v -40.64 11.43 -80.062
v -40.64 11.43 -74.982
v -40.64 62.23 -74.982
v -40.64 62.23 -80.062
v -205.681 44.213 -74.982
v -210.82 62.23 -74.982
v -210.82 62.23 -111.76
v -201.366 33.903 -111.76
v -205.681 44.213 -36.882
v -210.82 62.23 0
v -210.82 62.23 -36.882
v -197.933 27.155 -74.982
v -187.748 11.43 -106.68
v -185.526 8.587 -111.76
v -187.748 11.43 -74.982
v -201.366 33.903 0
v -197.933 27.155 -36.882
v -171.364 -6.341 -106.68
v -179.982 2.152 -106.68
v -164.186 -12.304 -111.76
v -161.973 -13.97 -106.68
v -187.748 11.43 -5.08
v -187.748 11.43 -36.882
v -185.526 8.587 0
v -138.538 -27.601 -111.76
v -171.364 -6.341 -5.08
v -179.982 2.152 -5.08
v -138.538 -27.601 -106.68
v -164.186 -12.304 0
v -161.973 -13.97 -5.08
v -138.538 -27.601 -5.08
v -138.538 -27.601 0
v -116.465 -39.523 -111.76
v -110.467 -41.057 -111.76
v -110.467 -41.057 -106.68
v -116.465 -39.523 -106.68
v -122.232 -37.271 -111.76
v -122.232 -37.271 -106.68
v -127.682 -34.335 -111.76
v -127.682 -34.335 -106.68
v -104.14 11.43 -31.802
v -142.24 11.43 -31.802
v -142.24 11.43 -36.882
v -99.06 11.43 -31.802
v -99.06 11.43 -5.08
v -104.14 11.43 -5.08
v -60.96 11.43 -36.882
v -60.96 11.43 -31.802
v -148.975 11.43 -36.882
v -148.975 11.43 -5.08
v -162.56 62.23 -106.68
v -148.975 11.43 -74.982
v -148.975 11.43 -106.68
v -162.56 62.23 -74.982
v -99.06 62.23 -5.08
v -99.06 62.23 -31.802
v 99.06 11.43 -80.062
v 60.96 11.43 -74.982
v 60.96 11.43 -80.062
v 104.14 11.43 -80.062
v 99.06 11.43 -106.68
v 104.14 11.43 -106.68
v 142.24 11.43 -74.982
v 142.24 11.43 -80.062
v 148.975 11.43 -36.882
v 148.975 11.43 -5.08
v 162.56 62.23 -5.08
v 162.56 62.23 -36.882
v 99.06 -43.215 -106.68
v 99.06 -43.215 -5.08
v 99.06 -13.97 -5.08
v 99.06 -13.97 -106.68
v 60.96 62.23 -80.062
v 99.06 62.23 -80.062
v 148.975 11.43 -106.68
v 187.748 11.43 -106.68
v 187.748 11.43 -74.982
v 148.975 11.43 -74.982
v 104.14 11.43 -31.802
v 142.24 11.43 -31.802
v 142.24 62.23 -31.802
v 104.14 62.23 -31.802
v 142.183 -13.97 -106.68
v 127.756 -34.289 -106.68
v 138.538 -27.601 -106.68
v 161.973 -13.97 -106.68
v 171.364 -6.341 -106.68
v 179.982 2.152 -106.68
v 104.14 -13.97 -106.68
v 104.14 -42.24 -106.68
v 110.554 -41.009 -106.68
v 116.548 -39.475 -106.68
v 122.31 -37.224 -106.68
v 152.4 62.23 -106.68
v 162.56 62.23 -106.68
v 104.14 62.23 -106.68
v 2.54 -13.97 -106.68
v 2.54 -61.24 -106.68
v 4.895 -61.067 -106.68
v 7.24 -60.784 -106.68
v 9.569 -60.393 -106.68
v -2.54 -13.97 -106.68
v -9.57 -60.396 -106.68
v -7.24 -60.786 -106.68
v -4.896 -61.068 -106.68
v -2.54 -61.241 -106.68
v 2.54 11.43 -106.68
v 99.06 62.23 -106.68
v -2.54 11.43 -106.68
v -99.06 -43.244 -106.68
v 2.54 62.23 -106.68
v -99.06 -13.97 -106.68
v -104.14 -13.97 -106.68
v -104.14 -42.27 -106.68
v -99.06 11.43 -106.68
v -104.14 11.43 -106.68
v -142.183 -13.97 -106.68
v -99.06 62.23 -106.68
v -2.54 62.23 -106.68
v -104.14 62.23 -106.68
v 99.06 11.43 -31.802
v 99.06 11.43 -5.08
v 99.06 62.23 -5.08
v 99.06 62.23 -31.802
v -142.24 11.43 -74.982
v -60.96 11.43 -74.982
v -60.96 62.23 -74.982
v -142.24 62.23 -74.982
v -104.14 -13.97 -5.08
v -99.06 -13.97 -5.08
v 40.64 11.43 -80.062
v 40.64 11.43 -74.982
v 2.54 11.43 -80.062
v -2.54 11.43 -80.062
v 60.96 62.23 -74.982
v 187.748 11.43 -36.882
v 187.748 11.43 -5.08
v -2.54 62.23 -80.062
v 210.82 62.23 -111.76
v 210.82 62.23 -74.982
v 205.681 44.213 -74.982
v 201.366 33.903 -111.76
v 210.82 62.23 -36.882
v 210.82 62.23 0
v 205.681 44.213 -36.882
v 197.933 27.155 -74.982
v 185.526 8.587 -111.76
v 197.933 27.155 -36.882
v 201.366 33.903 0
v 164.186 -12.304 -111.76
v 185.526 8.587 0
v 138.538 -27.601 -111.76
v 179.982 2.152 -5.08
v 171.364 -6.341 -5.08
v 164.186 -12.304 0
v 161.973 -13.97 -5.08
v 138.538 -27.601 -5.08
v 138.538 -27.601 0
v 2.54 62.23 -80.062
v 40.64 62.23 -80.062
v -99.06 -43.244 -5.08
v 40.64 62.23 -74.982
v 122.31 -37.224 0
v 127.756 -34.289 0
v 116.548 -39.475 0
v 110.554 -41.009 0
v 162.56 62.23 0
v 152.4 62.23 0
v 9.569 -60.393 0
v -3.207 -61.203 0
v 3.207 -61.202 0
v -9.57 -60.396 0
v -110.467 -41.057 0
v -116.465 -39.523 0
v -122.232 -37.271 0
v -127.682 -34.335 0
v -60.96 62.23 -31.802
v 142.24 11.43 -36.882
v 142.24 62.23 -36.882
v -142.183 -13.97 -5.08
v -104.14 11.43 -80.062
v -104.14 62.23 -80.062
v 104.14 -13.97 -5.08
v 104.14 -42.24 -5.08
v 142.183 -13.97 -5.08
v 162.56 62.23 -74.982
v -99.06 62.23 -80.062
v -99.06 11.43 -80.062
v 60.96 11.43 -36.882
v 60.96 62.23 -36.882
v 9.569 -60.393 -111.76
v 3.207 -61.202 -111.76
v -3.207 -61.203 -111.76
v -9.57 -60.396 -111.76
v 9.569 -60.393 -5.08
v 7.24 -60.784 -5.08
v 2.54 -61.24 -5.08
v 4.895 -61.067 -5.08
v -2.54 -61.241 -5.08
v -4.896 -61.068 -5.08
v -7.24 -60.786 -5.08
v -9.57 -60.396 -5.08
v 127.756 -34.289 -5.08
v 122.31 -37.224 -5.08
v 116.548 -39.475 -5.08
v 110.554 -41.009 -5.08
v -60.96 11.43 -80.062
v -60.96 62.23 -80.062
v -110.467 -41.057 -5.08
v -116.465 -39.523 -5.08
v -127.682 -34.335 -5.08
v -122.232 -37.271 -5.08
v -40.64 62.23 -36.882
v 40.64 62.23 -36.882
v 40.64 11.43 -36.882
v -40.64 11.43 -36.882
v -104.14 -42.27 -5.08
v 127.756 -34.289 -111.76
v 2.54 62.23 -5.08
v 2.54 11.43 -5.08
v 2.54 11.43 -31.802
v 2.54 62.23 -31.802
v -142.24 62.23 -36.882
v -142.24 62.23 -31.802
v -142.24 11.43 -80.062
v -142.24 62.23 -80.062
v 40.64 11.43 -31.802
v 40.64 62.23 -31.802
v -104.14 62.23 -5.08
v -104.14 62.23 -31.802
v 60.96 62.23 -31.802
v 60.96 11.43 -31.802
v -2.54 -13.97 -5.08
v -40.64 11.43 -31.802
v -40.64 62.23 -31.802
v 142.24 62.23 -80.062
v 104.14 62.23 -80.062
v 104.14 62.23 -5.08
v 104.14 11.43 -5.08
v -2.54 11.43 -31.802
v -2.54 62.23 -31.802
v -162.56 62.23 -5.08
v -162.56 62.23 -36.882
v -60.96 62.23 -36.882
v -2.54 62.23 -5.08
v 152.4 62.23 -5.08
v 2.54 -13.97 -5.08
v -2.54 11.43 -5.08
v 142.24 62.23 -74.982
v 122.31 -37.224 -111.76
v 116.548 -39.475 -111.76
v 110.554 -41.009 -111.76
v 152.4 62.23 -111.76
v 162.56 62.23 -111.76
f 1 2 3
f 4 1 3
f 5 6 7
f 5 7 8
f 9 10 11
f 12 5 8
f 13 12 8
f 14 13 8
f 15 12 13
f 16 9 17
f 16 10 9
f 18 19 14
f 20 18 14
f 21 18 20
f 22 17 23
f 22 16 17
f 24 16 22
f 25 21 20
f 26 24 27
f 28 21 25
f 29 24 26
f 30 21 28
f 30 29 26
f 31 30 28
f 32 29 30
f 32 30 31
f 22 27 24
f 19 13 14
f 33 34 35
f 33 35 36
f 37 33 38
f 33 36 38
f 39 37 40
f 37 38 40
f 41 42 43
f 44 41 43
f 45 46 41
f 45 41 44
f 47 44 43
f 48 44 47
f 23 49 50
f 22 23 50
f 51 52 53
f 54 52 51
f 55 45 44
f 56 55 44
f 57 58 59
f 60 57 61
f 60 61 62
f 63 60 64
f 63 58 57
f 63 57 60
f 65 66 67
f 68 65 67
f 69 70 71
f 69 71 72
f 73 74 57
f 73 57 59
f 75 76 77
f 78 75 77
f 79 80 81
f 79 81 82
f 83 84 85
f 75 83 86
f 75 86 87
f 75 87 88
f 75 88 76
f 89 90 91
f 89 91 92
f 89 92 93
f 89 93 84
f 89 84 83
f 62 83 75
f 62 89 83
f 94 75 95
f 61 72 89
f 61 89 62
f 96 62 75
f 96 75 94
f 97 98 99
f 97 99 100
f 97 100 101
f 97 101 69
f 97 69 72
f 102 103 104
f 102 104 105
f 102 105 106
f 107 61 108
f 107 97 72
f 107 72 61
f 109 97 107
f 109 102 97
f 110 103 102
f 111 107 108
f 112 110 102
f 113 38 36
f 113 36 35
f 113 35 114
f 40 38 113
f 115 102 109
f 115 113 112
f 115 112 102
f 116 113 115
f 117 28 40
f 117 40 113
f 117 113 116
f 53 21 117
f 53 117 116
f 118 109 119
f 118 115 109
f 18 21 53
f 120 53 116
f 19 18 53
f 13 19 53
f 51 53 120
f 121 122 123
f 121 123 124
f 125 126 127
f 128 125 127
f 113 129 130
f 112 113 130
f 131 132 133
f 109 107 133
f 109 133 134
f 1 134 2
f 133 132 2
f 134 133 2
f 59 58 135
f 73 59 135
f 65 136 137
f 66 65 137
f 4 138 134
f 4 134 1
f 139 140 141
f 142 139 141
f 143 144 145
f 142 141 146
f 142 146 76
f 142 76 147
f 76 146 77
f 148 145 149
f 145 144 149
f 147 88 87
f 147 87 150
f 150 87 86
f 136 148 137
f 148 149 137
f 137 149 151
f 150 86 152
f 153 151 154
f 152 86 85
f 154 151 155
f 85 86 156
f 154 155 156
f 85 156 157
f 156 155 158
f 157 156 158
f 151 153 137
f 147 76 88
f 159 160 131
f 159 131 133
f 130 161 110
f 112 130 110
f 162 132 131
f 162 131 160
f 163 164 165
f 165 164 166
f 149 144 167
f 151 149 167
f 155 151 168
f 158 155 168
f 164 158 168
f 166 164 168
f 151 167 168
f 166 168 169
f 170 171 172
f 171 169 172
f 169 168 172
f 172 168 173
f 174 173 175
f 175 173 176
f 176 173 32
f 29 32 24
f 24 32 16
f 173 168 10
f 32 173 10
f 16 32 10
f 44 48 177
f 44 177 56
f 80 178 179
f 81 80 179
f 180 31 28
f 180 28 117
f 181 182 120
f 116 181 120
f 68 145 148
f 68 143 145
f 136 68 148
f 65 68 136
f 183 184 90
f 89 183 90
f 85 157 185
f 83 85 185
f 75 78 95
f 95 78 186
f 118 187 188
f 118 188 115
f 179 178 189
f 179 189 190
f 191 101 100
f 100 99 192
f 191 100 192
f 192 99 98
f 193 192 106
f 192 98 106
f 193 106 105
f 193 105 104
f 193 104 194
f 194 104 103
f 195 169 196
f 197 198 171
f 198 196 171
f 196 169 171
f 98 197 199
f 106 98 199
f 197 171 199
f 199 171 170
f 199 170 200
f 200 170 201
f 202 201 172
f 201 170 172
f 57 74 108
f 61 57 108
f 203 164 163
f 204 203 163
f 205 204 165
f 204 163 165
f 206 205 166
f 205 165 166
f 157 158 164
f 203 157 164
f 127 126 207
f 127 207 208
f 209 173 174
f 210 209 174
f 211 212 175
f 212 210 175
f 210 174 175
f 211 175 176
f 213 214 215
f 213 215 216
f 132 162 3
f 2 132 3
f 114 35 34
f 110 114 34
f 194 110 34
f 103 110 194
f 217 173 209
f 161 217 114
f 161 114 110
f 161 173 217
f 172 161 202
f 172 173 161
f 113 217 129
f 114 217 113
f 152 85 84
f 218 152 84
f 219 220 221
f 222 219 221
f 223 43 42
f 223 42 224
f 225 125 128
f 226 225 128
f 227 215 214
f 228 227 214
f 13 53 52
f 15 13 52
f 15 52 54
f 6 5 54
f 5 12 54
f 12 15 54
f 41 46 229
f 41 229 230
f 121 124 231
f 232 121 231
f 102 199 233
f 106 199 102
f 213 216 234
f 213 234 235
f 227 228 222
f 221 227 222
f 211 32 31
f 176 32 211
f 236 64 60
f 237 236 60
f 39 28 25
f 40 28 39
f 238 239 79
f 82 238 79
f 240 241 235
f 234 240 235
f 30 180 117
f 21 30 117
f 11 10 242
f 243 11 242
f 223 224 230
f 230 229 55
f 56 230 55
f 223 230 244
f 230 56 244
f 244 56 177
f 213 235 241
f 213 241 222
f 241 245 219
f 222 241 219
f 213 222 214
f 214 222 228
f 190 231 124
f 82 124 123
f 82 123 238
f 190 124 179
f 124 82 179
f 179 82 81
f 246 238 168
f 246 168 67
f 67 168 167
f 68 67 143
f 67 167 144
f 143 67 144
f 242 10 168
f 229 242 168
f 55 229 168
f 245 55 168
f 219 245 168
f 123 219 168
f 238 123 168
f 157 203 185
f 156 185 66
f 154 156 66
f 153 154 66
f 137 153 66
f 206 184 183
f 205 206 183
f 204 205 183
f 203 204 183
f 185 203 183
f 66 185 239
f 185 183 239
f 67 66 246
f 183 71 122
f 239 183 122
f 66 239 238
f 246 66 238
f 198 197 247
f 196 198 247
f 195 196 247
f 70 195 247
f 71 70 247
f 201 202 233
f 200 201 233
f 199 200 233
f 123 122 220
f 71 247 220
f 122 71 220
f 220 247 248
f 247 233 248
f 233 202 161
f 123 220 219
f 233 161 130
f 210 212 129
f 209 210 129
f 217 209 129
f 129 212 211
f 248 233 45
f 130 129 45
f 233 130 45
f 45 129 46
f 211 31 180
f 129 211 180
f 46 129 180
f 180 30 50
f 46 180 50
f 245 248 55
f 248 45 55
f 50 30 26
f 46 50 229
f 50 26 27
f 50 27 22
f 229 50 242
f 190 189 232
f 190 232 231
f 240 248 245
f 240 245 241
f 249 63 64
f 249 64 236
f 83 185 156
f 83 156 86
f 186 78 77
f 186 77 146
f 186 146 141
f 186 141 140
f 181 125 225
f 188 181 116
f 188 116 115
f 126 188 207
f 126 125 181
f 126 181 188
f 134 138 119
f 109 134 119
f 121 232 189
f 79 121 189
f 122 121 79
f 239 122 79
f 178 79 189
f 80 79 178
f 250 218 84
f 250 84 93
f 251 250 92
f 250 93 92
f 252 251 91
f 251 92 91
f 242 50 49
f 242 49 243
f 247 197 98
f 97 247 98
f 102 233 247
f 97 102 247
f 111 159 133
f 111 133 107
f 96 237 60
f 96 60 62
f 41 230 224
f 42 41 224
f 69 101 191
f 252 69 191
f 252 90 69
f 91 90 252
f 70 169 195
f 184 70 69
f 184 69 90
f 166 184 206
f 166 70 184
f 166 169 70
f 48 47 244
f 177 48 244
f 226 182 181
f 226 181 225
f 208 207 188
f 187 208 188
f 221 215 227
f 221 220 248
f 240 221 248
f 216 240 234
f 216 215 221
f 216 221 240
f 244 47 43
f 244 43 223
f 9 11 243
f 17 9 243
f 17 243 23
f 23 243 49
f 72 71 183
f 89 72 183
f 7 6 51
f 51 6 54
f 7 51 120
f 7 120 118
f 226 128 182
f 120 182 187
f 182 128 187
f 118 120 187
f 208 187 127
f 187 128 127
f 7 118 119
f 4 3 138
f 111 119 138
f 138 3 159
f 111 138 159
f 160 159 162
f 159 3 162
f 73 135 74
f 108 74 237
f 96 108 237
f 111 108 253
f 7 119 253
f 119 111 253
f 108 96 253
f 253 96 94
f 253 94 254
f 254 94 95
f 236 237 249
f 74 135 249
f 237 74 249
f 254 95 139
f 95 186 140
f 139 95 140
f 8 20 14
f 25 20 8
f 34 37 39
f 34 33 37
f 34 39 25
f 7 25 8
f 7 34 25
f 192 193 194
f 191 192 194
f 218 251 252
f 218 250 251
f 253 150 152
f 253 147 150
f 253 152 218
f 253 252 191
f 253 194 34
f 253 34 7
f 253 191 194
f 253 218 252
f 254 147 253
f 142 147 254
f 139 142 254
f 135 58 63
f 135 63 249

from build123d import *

# Parameters (mm, degrees)
BOSS_EXTRUDE1_DEPTH                 = 111.76
SKETCH5_W                           = 304.8
SKETCH5_H                           = 25.4
CUT_EXTRUDE3_DEPTH                  = 101.6
CUT_EXTRUDE4_DEPTH                  = 227.288199427
CUT_EXTRUDE4_DEPTH_BACK             = 227.288199427
SKETCH3_W                           = 96.52
SKETCH3_H                           = 101.6
SKETCH3_W_2                         = 48.26
CUT_EXTRUDE5_REACH                  = 288.663
SKETCH6_W                           = 38.1
SKETCH6_H                           = 50.8
SKETCH7_W                           = 81.28
SKETCH7_H                           = 50.8
BOSS_EXTRUDE2_DEPTH                 = 5.08
SKETCH9_W                           = 5.08
SKETCH9_H                           = 95.25
BOSS_EXTRUDE3_DEPTH                 = 10.16
SKETCH10_W                          = 5.08
SKETCH10_H                          = 95.206439839
BOSS_EXTRUDE4_DEPTH                 = 10.16
CUT_EXTRUDE7_REACH                  = 208.854
FILLET1_R                           = 50.8
BOSS_EXTRUDE5_REACH                 = 208.854
CUT_EXTRUDE8_REACH                  = 248.593
CUT_EXTRUDE8_END_RADIUS             = 126.32098656
CUT_EXTRUDE8_DIRECTION_2_REACH      = 248.593
CUT_EXTRUDE8_DIRECTION_2_END_RADIUS = 126.32098656


with BuildPart() as part:
    # Sketch1 → Boss-Extrude1 (new body)
    with BuildSketch(Plane.XY):
        Polygon((-152.4, 62.23), (-152.4, -33.02), (0, -62.23), (152.4, -32.976439839), (152.4, 62.23), align=None)
    extrude(amount=-BOSS_EXTRUDE1_DEPTH)

    # Sketch5 → Cut-Extrude3 (cut)
    with BuildSketch(Plane.XY.offset(-5.08)):
        with Locations((0, -1.27)):
            Rectangle(SKETCH5_W, SKETCH5_H)
    extrude(amount=-CUT_EXTRUDE3_DEPTH, mode=Mode.SUBTRACT)

    # Sketch3 → Cut-Extrude4 (cut, two sides: drawn at the far end of the back side and taken through both)
    with BuildSketch(Plane(origin=(0, 62.23, 0), x_dir=(1, 0, 0), z_dir=(0, 1, 0)).offset(-CUT_EXTRUDE4_DEPTH_BACK)):
        with Locations((-50.8, 55.88)):
            Rectangle(SKETCH3_W, SKETCH3_H)
        with Locations((50.8, 55.88)):
            Rectangle(SKETCH3_W, SKETCH3_H)
        with Locations((-128.27, 55.88)):
            Rectangle(SKETCH3_W_2, SKETCH3_H)
        with Locations((128.27, 55.88)):
            Rectangle(SKETCH3_W_2, SKETCH3_H)
    extrude(amount=CUT_EXTRUDE4_DEPTH + CUT_EXTRUDE4_DEPTH_BACK, mode=Mode.SUBTRACT)

    # Cut-Extrude5: up to this face of the body (flat: up to its plane)
    cut_extrude5_end = Plane(part.part.faces().sort_by_distance((104.14, 36.83, -55.88))[0])
    # Sketch6 → Cut-Extrude5 (cut, up to the picked face)
    with BuildSketch(Plane.ZY.offset(104.14), mode=Mode.PRIVATE) as cut_extrude5_sk1:
        with Locations((-55.932057734, 36.83)):
            Rectangle(SKETCH6_W, SKETCH6_H)
    cut_extrude5_tool1 = split(extrude(cut_extrude5_sk1.sketch, amount=-CUT_EXTRUDE5_REACH, mode=Mode.PRIVATE), bisect_by=cut_extrude5_end, keep=Keep.BOTH, mode=Mode.PRIVATE)
    add(cut_extrude5_tool1.solids().sort_by(Axis((-104.14, 36.83, -55.932058), (1, 0, 0)))[0], mode=Mode.SUBTRACT)

    # Sketch7 → Boss-Extrude2 (add)
    with BuildSketch(Plane(origin=(0, 0, -36.882057734), x_dir=(-1, 0, 0), z_dir=(0, 0, -1))):
        with Locations((0, 36.83)):
            Rectangle(SKETCH7_W, SKETCH7_H)
        with Locations((101.6, 36.83)):
            Rectangle(SKETCH7_W, SKETCH7_H)
        with Locations((-101.6, 36.83)):
            Rectangle(SKETCH7_W, SKETCH7_H)
    boss_extrude2 = extrude(amount=-BOSS_EXTRUDE2_DEPTH)

    # Mirror1: Boss-Extrude2 across plane
    add(boss_extrude2.mirror(Plane(origin=(0, 0, -55.932057734), x_dir=(1, 0, 0), z_dir=(0, 0, -1))))

    # Sketch9 → Boss-Extrude3 (add)
    with BuildSketch(Plane.ZY.offset(152.4)):
        with Locations((-109.22, 14.605)):
            Rectangle(SKETCH9_W, SKETCH9_H)
        with Locations((-2.54, 14.605)):
            Rectangle(SKETCH9_W, SKETCH9_H)
    extrude(amount=BOSS_EXTRUDE3_DEPTH)

    # Sketch10 → Boss-Extrude4 (add)
    with BuildSketch(Plane(origin=(152.4, 0, 0), x_dir=(0, 0, -1), z_dir=(1, 0, 0))):
        with Locations((2.54, 14.626780081)):
            Rectangle(SKETCH10_W, SKETCH10_H)
        with Locations((109.22, 14.626780081)):
            Rectangle(SKETCH10_W, SKETCH10_H)
    extrude(amount=BOSS_EXTRUDE4_DEPTH)

    # Cut-Extrude7: up to this face of the body (flat: up to its plane)
    cut_extrude7_end = Plane(part.part.faces().sort_by_distance((-0.011490312, 7.400814094, -111.76))[0])
    # Sketch11 → Cut-Extrude7 (cut, up to the picked face)
    with BuildSketch(Plane.XY, mode=Mode.PRIVATE) as cut_extrude7_sk1:
        Polygon((-162.56, -12.7), (-119.696308585, -39.288207521), (-152.4, -33.02), (-162.56, -33.02), align=None)
    cut_extrude7_tool1 = split(extrude(cut_extrude7_sk1.sketch, amount=-CUT_EXTRUDE7_REACH, mode=Mode.PRIVATE), bisect_by=cut_extrude7_end, keep=Keep.BOTH, mode=Mode.PRIVATE)
    # Sketch11 → Cut-Extrude7 (cut, up to the picked face)
    with BuildSketch(Plane.XY, mode=Mode.PRIVATE) as cut_extrude7_sk2:
        Polygon((152.4, -33.02), (162.56, -33.02), (162.56, -12.7), (119.696308585, -39.288207521), align=None)
    cut_extrude7_tool2 = split(extrude(cut_extrude7_sk2.sketch, amount=-CUT_EXTRUDE7_REACH, mode=Mode.PRIVATE), bisect_by=cut_extrude7_end, keep=Keep.BOTH, mode=Mode.PRIVATE)
    add(cut_extrude7_tool1.solids().sort_by(Axis((-148.539263, -27.801749, 0), (0, 0, -1)))[0], mode=Mode.SUBTRACT)
    add(cut_extrude7_tool2.solids().sort_by(Axis((148.539263, -27.801749, 0), (0, 0, -1)))[0], mode=Mode.SUBTRACT)

    # Fillet1
    # the kernel refuses this fillet: 50.8 mm, written as the material it takes off along each edge
    with BuildSketch(Plane(origin=(-162.56, -12.7, 70.671047804), x_dir=(0.8497897447130388, -0.5271217978613181, 0), z_dir=(0, 0, -1)), Plane(origin=(-162.56, -12.7, -36.008952196), x_dir=(0.8497897447130388, -0.5271217978613181, 0), z_dir=(0, 0, -1)), Plane(origin=(162.56, -12.7, 70.671047804), x_dir=(0, 1, 0), z_dir=(0, 0, -1))) as fillet1_piece_1:
        with BuildLine():
            CenterArc((FILLET1_R * 0.556464943335, -FILLET1_R), FILLET1_R, 90, 58.188808221)
            Line((-FILLET1_R * 0.293324801378, -FILLET1_R * 0.472878202139), (0, 0))
            Line((0, 0), (FILLET1_R * 0.556464943335, 0))
        make_face()
    extrude(amount=146.422095607, mode=Mode.SUBTRACT)
    with BuildSketch(Plane(origin=(-119.696308585, -39.288207521, -83.186546401), x_dir=(0.9821230119270369, -0.18824024395268216, 0), z_dir=(0, 0, -1)), Plane(origin=(-119.696308585, -39.288207521, 23.493453599), x_dir=(0.9821230119270369, -0.18824024395268216, 0), z_dir=(0, 0, -1))) as fillet1_piece_2:
        with BuildLine():
            CenterArc((FILLET1_R * 0.184987823618, -FILLET1_R), FILLET1_R, 90, 20.961087149)
            Line((-FILLET1_R * 0.172745995297, -FILLET1_R * 0.0661764005955), (0, 0))
            Line((0, 0), (FILLET1_R * 0.184987823618, 0))
        make_face()
    extrude(amount=52.066907199, mode=Mode.SUBTRACT)
    with BuildSketch(Plane(origin=(162.56, -12.7, -36.008952196), x_dir=(-0.8497897447130388, -0.5271217978613181, 0), z_dir=(0, 0, -1))) as fillet1_piece_3:
        with BuildLine():
            CenterArc((FILLET1_R * 0.556464943335, FILLET1_R), FILLET1_R, 211.811191779, 58.188808221)
            Line((-FILLET1_R * 0.293324801378, FILLET1_R * 0.472878202139), (0, 0))
            Line((0, 0), (FILLET1_R * 0.556464943335, 0))
        make_face()
    extrude(amount=146.422095607, mode=Mode.SUBTRACT)
    with BuildSketch(Plane(origin=(119.776180176, -39.238663434, 23.475348992), x_dir=(-0.9820710795721669, -0.18851099349363817, 0), z_dir=(0, 0, -1)), Plane(origin=(119.776180176, -39.238663434, -83.204651008), x_dir=(-0.9820710795721669, -0.18851099349363817, 0), z_dir=(0, 0, -1))) as fillet1_piece_4:
        with BuildLine():
            CenterArc((FILLET1_R * 0.184845267653, FILLET1_R), FILLET1_R, 249.054708445, 20.945291555)
            Line((-FILLET1_R * 0.172631096402, FILLET1_R * 0.0660778141933), (0, 0))
            Line((0, 0), (FILLET1_R * 0.184845267653, 0))
        make_face()
    extrude(amount=52.030697984, mode=Mode.SUBTRACT)
    with BuildSketch(Plane(origin=(0, -62.23, 24.359816254), x_dir=(-0.982123011927037, 0.1882402439526816, 0), z_dir=(0, 0, -1))) as fillet1_piece_5:
        with BuildLine():
            CenterArc((FILLET1_R * 0.191809576801, FILLET1_R), FILLET1_R, 248.283995147, 21.716004853)
            Line((-FILLET1_R * 0.178196707507, FILLET1_R * 0.0709707488072), (0, 0))
            Line((0, 0), (FILLET1_R * 0.191809576801, 0))
        make_face()
    extrude(amount=160.479632508, mode=Mode.SUBTRACT)

    # Boss-Extrude5: up to this face of the body (flat: up to its plane)
    boss_extrude5_end = Plane(part.part.faces().sort_by_distance((-0.004732582, 8.379000895, -111.76))[0])
    # Sketch12 → Boss-Extrude5 (add, up to the picked face)
    with BuildSketch(Plane.XY, mode=Mode.PRIVATE) as boss_extrude5_sk1:
        with BuildLine():
            Line((-162.56, 62.23), (-210.82, 62.23))
            ThreePointArc((-210.82, 62.23), (-185.525923559, 8.586514121), (-138.537787331, -27.60089991))
            Line((-138.537787331, -27.60089991), (-162.56, 62.23))
        make_face()
    boss_extrude5_tool1 = split(extrude(boss_extrude5_sk1.sketch, amount=-BOSS_EXTRUDE5_REACH, mode=Mode.PRIVATE), bisect_by=boss_extrude5_end, keep=Keep.BOTH, mode=Mode.PRIVATE)
    # Sketch12 → Boss-Extrude5 (add, up to the picked face)
    with BuildSketch(Plane.XY, mode=Mode.PRIVATE) as boss_extrude5_sk2:
        with BuildLine():
            Line((162.56, 62.23), (210.82, 62.23))
            ThreePointArc((210.82, 62.23), (185.525923559, 8.586514121), (138.537787331, -27.60089991))
            Line((138.537787331, -27.60089991), (162.56, 62.23))
        make_face()
    boss_extrude5_tool2 = split(extrude(boss_extrude5_sk2.sketch, amount=-BOSS_EXTRUDE5_REACH, mode=Mode.PRIVATE), bisect_by=boss_extrude5_end, keep=Keep.BOTH, mode=Mode.PRIVATE)
    add(boss_extrude5_tool1.solids().sort_by(Axis((-173.436994, 26.131053, 0), (0, 0, -1)))[0])
    add(boss_extrude5_tool2.solids().sort_by(Axis((173.436994, 26.131053, 0), (0, 0, -1)))[0])

    # Cut-Extrude8: up to this cylinder (the profile starts inside it)
    cut_extrude8_end = Plane(origin=(-87.109319049, 87.777192878, -55.90231), z_dir=(0, 0, 1)) * Cylinder(CUT_EXTRUDE8_END_RADIUS, 750.827973119, mode=Mode.PRIVATE)
    # Sketch13 → Cut-Extrude8 (cut, up to the surface)
    with BuildSketch(Plane(origin=(0, 0, 0), x_dir=(0, 0, -1), z_dir=(1, 0, 0)), mode=Mode.PRIVATE) as cut_extrude8_sk1:
        Polygon((36.882057734, 62.23), (36.882057734, 11.43), (5.08, 11.43), (5.08, -13.97), (106.68, -13.97), (106.68, 11.43), (74.982057734, 11.43), (74.982057734, 62.23), align=None)
    cut_extrude8_tool1 = extrude(cut_extrude8_sk1.sketch, amount=-CUT_EXTRUDE8_REACH, mode=Mode.PRIVATE) & cut_extrude8_end
    add(cut_extrude8_tool1.solids().sort_by_distance((0, 15.058571, -55.90231))[0], mode=Mode.SUBTRACT)

    # Cut-Extrude8 direction 2: up to this cylinder (the profile starts inside it)
    cut_extrude8_direction_2_end = Plane(origin=(87.109319049, 87.777192878, -55.90231), z_dir=(0, 0, 1)) * Cylinder(CUT_EXTRUDE8_DIRECTION_2_END_RADIUS, 750.827973119, mode=Mode.PRIVATE)
    # Sketch13 → Cut-Extrude8 direction 2 (cut, up to the surface)
    with BuildSketch(Plane(origin=(0, 0, 0), x_dir=(0, 0, -1), z_dir=(1, 0, 0)), mode=Mode.PRIVATE) as cut_extrude8_direction_2_sk1:
        Polygon((36.882057734, 62.23), (36.882057734, 11.43), (5.08, 11.43), (5.08, -13.97), (106.68, -13.97), (106.68, 11.43), (74.982057734, 11.43), (74.982057734, 62.23), align=None)
    cut_extrude8_direction_2_tool1 = extrude(cut_extrude8_direction_2_sk1.sketch, amount=CUT_EXTRUDE8_DIRECTION_2_REACH, mode=Mode.PRIVATE) & cut_extrude8_direction_2_end
    add(cut_extrude8_direction_2_tool1.solids().sort_by_distance((0, 15.058571, -55.90231))[0], mode=Mode.SUBTRACT)


solid = part.part
